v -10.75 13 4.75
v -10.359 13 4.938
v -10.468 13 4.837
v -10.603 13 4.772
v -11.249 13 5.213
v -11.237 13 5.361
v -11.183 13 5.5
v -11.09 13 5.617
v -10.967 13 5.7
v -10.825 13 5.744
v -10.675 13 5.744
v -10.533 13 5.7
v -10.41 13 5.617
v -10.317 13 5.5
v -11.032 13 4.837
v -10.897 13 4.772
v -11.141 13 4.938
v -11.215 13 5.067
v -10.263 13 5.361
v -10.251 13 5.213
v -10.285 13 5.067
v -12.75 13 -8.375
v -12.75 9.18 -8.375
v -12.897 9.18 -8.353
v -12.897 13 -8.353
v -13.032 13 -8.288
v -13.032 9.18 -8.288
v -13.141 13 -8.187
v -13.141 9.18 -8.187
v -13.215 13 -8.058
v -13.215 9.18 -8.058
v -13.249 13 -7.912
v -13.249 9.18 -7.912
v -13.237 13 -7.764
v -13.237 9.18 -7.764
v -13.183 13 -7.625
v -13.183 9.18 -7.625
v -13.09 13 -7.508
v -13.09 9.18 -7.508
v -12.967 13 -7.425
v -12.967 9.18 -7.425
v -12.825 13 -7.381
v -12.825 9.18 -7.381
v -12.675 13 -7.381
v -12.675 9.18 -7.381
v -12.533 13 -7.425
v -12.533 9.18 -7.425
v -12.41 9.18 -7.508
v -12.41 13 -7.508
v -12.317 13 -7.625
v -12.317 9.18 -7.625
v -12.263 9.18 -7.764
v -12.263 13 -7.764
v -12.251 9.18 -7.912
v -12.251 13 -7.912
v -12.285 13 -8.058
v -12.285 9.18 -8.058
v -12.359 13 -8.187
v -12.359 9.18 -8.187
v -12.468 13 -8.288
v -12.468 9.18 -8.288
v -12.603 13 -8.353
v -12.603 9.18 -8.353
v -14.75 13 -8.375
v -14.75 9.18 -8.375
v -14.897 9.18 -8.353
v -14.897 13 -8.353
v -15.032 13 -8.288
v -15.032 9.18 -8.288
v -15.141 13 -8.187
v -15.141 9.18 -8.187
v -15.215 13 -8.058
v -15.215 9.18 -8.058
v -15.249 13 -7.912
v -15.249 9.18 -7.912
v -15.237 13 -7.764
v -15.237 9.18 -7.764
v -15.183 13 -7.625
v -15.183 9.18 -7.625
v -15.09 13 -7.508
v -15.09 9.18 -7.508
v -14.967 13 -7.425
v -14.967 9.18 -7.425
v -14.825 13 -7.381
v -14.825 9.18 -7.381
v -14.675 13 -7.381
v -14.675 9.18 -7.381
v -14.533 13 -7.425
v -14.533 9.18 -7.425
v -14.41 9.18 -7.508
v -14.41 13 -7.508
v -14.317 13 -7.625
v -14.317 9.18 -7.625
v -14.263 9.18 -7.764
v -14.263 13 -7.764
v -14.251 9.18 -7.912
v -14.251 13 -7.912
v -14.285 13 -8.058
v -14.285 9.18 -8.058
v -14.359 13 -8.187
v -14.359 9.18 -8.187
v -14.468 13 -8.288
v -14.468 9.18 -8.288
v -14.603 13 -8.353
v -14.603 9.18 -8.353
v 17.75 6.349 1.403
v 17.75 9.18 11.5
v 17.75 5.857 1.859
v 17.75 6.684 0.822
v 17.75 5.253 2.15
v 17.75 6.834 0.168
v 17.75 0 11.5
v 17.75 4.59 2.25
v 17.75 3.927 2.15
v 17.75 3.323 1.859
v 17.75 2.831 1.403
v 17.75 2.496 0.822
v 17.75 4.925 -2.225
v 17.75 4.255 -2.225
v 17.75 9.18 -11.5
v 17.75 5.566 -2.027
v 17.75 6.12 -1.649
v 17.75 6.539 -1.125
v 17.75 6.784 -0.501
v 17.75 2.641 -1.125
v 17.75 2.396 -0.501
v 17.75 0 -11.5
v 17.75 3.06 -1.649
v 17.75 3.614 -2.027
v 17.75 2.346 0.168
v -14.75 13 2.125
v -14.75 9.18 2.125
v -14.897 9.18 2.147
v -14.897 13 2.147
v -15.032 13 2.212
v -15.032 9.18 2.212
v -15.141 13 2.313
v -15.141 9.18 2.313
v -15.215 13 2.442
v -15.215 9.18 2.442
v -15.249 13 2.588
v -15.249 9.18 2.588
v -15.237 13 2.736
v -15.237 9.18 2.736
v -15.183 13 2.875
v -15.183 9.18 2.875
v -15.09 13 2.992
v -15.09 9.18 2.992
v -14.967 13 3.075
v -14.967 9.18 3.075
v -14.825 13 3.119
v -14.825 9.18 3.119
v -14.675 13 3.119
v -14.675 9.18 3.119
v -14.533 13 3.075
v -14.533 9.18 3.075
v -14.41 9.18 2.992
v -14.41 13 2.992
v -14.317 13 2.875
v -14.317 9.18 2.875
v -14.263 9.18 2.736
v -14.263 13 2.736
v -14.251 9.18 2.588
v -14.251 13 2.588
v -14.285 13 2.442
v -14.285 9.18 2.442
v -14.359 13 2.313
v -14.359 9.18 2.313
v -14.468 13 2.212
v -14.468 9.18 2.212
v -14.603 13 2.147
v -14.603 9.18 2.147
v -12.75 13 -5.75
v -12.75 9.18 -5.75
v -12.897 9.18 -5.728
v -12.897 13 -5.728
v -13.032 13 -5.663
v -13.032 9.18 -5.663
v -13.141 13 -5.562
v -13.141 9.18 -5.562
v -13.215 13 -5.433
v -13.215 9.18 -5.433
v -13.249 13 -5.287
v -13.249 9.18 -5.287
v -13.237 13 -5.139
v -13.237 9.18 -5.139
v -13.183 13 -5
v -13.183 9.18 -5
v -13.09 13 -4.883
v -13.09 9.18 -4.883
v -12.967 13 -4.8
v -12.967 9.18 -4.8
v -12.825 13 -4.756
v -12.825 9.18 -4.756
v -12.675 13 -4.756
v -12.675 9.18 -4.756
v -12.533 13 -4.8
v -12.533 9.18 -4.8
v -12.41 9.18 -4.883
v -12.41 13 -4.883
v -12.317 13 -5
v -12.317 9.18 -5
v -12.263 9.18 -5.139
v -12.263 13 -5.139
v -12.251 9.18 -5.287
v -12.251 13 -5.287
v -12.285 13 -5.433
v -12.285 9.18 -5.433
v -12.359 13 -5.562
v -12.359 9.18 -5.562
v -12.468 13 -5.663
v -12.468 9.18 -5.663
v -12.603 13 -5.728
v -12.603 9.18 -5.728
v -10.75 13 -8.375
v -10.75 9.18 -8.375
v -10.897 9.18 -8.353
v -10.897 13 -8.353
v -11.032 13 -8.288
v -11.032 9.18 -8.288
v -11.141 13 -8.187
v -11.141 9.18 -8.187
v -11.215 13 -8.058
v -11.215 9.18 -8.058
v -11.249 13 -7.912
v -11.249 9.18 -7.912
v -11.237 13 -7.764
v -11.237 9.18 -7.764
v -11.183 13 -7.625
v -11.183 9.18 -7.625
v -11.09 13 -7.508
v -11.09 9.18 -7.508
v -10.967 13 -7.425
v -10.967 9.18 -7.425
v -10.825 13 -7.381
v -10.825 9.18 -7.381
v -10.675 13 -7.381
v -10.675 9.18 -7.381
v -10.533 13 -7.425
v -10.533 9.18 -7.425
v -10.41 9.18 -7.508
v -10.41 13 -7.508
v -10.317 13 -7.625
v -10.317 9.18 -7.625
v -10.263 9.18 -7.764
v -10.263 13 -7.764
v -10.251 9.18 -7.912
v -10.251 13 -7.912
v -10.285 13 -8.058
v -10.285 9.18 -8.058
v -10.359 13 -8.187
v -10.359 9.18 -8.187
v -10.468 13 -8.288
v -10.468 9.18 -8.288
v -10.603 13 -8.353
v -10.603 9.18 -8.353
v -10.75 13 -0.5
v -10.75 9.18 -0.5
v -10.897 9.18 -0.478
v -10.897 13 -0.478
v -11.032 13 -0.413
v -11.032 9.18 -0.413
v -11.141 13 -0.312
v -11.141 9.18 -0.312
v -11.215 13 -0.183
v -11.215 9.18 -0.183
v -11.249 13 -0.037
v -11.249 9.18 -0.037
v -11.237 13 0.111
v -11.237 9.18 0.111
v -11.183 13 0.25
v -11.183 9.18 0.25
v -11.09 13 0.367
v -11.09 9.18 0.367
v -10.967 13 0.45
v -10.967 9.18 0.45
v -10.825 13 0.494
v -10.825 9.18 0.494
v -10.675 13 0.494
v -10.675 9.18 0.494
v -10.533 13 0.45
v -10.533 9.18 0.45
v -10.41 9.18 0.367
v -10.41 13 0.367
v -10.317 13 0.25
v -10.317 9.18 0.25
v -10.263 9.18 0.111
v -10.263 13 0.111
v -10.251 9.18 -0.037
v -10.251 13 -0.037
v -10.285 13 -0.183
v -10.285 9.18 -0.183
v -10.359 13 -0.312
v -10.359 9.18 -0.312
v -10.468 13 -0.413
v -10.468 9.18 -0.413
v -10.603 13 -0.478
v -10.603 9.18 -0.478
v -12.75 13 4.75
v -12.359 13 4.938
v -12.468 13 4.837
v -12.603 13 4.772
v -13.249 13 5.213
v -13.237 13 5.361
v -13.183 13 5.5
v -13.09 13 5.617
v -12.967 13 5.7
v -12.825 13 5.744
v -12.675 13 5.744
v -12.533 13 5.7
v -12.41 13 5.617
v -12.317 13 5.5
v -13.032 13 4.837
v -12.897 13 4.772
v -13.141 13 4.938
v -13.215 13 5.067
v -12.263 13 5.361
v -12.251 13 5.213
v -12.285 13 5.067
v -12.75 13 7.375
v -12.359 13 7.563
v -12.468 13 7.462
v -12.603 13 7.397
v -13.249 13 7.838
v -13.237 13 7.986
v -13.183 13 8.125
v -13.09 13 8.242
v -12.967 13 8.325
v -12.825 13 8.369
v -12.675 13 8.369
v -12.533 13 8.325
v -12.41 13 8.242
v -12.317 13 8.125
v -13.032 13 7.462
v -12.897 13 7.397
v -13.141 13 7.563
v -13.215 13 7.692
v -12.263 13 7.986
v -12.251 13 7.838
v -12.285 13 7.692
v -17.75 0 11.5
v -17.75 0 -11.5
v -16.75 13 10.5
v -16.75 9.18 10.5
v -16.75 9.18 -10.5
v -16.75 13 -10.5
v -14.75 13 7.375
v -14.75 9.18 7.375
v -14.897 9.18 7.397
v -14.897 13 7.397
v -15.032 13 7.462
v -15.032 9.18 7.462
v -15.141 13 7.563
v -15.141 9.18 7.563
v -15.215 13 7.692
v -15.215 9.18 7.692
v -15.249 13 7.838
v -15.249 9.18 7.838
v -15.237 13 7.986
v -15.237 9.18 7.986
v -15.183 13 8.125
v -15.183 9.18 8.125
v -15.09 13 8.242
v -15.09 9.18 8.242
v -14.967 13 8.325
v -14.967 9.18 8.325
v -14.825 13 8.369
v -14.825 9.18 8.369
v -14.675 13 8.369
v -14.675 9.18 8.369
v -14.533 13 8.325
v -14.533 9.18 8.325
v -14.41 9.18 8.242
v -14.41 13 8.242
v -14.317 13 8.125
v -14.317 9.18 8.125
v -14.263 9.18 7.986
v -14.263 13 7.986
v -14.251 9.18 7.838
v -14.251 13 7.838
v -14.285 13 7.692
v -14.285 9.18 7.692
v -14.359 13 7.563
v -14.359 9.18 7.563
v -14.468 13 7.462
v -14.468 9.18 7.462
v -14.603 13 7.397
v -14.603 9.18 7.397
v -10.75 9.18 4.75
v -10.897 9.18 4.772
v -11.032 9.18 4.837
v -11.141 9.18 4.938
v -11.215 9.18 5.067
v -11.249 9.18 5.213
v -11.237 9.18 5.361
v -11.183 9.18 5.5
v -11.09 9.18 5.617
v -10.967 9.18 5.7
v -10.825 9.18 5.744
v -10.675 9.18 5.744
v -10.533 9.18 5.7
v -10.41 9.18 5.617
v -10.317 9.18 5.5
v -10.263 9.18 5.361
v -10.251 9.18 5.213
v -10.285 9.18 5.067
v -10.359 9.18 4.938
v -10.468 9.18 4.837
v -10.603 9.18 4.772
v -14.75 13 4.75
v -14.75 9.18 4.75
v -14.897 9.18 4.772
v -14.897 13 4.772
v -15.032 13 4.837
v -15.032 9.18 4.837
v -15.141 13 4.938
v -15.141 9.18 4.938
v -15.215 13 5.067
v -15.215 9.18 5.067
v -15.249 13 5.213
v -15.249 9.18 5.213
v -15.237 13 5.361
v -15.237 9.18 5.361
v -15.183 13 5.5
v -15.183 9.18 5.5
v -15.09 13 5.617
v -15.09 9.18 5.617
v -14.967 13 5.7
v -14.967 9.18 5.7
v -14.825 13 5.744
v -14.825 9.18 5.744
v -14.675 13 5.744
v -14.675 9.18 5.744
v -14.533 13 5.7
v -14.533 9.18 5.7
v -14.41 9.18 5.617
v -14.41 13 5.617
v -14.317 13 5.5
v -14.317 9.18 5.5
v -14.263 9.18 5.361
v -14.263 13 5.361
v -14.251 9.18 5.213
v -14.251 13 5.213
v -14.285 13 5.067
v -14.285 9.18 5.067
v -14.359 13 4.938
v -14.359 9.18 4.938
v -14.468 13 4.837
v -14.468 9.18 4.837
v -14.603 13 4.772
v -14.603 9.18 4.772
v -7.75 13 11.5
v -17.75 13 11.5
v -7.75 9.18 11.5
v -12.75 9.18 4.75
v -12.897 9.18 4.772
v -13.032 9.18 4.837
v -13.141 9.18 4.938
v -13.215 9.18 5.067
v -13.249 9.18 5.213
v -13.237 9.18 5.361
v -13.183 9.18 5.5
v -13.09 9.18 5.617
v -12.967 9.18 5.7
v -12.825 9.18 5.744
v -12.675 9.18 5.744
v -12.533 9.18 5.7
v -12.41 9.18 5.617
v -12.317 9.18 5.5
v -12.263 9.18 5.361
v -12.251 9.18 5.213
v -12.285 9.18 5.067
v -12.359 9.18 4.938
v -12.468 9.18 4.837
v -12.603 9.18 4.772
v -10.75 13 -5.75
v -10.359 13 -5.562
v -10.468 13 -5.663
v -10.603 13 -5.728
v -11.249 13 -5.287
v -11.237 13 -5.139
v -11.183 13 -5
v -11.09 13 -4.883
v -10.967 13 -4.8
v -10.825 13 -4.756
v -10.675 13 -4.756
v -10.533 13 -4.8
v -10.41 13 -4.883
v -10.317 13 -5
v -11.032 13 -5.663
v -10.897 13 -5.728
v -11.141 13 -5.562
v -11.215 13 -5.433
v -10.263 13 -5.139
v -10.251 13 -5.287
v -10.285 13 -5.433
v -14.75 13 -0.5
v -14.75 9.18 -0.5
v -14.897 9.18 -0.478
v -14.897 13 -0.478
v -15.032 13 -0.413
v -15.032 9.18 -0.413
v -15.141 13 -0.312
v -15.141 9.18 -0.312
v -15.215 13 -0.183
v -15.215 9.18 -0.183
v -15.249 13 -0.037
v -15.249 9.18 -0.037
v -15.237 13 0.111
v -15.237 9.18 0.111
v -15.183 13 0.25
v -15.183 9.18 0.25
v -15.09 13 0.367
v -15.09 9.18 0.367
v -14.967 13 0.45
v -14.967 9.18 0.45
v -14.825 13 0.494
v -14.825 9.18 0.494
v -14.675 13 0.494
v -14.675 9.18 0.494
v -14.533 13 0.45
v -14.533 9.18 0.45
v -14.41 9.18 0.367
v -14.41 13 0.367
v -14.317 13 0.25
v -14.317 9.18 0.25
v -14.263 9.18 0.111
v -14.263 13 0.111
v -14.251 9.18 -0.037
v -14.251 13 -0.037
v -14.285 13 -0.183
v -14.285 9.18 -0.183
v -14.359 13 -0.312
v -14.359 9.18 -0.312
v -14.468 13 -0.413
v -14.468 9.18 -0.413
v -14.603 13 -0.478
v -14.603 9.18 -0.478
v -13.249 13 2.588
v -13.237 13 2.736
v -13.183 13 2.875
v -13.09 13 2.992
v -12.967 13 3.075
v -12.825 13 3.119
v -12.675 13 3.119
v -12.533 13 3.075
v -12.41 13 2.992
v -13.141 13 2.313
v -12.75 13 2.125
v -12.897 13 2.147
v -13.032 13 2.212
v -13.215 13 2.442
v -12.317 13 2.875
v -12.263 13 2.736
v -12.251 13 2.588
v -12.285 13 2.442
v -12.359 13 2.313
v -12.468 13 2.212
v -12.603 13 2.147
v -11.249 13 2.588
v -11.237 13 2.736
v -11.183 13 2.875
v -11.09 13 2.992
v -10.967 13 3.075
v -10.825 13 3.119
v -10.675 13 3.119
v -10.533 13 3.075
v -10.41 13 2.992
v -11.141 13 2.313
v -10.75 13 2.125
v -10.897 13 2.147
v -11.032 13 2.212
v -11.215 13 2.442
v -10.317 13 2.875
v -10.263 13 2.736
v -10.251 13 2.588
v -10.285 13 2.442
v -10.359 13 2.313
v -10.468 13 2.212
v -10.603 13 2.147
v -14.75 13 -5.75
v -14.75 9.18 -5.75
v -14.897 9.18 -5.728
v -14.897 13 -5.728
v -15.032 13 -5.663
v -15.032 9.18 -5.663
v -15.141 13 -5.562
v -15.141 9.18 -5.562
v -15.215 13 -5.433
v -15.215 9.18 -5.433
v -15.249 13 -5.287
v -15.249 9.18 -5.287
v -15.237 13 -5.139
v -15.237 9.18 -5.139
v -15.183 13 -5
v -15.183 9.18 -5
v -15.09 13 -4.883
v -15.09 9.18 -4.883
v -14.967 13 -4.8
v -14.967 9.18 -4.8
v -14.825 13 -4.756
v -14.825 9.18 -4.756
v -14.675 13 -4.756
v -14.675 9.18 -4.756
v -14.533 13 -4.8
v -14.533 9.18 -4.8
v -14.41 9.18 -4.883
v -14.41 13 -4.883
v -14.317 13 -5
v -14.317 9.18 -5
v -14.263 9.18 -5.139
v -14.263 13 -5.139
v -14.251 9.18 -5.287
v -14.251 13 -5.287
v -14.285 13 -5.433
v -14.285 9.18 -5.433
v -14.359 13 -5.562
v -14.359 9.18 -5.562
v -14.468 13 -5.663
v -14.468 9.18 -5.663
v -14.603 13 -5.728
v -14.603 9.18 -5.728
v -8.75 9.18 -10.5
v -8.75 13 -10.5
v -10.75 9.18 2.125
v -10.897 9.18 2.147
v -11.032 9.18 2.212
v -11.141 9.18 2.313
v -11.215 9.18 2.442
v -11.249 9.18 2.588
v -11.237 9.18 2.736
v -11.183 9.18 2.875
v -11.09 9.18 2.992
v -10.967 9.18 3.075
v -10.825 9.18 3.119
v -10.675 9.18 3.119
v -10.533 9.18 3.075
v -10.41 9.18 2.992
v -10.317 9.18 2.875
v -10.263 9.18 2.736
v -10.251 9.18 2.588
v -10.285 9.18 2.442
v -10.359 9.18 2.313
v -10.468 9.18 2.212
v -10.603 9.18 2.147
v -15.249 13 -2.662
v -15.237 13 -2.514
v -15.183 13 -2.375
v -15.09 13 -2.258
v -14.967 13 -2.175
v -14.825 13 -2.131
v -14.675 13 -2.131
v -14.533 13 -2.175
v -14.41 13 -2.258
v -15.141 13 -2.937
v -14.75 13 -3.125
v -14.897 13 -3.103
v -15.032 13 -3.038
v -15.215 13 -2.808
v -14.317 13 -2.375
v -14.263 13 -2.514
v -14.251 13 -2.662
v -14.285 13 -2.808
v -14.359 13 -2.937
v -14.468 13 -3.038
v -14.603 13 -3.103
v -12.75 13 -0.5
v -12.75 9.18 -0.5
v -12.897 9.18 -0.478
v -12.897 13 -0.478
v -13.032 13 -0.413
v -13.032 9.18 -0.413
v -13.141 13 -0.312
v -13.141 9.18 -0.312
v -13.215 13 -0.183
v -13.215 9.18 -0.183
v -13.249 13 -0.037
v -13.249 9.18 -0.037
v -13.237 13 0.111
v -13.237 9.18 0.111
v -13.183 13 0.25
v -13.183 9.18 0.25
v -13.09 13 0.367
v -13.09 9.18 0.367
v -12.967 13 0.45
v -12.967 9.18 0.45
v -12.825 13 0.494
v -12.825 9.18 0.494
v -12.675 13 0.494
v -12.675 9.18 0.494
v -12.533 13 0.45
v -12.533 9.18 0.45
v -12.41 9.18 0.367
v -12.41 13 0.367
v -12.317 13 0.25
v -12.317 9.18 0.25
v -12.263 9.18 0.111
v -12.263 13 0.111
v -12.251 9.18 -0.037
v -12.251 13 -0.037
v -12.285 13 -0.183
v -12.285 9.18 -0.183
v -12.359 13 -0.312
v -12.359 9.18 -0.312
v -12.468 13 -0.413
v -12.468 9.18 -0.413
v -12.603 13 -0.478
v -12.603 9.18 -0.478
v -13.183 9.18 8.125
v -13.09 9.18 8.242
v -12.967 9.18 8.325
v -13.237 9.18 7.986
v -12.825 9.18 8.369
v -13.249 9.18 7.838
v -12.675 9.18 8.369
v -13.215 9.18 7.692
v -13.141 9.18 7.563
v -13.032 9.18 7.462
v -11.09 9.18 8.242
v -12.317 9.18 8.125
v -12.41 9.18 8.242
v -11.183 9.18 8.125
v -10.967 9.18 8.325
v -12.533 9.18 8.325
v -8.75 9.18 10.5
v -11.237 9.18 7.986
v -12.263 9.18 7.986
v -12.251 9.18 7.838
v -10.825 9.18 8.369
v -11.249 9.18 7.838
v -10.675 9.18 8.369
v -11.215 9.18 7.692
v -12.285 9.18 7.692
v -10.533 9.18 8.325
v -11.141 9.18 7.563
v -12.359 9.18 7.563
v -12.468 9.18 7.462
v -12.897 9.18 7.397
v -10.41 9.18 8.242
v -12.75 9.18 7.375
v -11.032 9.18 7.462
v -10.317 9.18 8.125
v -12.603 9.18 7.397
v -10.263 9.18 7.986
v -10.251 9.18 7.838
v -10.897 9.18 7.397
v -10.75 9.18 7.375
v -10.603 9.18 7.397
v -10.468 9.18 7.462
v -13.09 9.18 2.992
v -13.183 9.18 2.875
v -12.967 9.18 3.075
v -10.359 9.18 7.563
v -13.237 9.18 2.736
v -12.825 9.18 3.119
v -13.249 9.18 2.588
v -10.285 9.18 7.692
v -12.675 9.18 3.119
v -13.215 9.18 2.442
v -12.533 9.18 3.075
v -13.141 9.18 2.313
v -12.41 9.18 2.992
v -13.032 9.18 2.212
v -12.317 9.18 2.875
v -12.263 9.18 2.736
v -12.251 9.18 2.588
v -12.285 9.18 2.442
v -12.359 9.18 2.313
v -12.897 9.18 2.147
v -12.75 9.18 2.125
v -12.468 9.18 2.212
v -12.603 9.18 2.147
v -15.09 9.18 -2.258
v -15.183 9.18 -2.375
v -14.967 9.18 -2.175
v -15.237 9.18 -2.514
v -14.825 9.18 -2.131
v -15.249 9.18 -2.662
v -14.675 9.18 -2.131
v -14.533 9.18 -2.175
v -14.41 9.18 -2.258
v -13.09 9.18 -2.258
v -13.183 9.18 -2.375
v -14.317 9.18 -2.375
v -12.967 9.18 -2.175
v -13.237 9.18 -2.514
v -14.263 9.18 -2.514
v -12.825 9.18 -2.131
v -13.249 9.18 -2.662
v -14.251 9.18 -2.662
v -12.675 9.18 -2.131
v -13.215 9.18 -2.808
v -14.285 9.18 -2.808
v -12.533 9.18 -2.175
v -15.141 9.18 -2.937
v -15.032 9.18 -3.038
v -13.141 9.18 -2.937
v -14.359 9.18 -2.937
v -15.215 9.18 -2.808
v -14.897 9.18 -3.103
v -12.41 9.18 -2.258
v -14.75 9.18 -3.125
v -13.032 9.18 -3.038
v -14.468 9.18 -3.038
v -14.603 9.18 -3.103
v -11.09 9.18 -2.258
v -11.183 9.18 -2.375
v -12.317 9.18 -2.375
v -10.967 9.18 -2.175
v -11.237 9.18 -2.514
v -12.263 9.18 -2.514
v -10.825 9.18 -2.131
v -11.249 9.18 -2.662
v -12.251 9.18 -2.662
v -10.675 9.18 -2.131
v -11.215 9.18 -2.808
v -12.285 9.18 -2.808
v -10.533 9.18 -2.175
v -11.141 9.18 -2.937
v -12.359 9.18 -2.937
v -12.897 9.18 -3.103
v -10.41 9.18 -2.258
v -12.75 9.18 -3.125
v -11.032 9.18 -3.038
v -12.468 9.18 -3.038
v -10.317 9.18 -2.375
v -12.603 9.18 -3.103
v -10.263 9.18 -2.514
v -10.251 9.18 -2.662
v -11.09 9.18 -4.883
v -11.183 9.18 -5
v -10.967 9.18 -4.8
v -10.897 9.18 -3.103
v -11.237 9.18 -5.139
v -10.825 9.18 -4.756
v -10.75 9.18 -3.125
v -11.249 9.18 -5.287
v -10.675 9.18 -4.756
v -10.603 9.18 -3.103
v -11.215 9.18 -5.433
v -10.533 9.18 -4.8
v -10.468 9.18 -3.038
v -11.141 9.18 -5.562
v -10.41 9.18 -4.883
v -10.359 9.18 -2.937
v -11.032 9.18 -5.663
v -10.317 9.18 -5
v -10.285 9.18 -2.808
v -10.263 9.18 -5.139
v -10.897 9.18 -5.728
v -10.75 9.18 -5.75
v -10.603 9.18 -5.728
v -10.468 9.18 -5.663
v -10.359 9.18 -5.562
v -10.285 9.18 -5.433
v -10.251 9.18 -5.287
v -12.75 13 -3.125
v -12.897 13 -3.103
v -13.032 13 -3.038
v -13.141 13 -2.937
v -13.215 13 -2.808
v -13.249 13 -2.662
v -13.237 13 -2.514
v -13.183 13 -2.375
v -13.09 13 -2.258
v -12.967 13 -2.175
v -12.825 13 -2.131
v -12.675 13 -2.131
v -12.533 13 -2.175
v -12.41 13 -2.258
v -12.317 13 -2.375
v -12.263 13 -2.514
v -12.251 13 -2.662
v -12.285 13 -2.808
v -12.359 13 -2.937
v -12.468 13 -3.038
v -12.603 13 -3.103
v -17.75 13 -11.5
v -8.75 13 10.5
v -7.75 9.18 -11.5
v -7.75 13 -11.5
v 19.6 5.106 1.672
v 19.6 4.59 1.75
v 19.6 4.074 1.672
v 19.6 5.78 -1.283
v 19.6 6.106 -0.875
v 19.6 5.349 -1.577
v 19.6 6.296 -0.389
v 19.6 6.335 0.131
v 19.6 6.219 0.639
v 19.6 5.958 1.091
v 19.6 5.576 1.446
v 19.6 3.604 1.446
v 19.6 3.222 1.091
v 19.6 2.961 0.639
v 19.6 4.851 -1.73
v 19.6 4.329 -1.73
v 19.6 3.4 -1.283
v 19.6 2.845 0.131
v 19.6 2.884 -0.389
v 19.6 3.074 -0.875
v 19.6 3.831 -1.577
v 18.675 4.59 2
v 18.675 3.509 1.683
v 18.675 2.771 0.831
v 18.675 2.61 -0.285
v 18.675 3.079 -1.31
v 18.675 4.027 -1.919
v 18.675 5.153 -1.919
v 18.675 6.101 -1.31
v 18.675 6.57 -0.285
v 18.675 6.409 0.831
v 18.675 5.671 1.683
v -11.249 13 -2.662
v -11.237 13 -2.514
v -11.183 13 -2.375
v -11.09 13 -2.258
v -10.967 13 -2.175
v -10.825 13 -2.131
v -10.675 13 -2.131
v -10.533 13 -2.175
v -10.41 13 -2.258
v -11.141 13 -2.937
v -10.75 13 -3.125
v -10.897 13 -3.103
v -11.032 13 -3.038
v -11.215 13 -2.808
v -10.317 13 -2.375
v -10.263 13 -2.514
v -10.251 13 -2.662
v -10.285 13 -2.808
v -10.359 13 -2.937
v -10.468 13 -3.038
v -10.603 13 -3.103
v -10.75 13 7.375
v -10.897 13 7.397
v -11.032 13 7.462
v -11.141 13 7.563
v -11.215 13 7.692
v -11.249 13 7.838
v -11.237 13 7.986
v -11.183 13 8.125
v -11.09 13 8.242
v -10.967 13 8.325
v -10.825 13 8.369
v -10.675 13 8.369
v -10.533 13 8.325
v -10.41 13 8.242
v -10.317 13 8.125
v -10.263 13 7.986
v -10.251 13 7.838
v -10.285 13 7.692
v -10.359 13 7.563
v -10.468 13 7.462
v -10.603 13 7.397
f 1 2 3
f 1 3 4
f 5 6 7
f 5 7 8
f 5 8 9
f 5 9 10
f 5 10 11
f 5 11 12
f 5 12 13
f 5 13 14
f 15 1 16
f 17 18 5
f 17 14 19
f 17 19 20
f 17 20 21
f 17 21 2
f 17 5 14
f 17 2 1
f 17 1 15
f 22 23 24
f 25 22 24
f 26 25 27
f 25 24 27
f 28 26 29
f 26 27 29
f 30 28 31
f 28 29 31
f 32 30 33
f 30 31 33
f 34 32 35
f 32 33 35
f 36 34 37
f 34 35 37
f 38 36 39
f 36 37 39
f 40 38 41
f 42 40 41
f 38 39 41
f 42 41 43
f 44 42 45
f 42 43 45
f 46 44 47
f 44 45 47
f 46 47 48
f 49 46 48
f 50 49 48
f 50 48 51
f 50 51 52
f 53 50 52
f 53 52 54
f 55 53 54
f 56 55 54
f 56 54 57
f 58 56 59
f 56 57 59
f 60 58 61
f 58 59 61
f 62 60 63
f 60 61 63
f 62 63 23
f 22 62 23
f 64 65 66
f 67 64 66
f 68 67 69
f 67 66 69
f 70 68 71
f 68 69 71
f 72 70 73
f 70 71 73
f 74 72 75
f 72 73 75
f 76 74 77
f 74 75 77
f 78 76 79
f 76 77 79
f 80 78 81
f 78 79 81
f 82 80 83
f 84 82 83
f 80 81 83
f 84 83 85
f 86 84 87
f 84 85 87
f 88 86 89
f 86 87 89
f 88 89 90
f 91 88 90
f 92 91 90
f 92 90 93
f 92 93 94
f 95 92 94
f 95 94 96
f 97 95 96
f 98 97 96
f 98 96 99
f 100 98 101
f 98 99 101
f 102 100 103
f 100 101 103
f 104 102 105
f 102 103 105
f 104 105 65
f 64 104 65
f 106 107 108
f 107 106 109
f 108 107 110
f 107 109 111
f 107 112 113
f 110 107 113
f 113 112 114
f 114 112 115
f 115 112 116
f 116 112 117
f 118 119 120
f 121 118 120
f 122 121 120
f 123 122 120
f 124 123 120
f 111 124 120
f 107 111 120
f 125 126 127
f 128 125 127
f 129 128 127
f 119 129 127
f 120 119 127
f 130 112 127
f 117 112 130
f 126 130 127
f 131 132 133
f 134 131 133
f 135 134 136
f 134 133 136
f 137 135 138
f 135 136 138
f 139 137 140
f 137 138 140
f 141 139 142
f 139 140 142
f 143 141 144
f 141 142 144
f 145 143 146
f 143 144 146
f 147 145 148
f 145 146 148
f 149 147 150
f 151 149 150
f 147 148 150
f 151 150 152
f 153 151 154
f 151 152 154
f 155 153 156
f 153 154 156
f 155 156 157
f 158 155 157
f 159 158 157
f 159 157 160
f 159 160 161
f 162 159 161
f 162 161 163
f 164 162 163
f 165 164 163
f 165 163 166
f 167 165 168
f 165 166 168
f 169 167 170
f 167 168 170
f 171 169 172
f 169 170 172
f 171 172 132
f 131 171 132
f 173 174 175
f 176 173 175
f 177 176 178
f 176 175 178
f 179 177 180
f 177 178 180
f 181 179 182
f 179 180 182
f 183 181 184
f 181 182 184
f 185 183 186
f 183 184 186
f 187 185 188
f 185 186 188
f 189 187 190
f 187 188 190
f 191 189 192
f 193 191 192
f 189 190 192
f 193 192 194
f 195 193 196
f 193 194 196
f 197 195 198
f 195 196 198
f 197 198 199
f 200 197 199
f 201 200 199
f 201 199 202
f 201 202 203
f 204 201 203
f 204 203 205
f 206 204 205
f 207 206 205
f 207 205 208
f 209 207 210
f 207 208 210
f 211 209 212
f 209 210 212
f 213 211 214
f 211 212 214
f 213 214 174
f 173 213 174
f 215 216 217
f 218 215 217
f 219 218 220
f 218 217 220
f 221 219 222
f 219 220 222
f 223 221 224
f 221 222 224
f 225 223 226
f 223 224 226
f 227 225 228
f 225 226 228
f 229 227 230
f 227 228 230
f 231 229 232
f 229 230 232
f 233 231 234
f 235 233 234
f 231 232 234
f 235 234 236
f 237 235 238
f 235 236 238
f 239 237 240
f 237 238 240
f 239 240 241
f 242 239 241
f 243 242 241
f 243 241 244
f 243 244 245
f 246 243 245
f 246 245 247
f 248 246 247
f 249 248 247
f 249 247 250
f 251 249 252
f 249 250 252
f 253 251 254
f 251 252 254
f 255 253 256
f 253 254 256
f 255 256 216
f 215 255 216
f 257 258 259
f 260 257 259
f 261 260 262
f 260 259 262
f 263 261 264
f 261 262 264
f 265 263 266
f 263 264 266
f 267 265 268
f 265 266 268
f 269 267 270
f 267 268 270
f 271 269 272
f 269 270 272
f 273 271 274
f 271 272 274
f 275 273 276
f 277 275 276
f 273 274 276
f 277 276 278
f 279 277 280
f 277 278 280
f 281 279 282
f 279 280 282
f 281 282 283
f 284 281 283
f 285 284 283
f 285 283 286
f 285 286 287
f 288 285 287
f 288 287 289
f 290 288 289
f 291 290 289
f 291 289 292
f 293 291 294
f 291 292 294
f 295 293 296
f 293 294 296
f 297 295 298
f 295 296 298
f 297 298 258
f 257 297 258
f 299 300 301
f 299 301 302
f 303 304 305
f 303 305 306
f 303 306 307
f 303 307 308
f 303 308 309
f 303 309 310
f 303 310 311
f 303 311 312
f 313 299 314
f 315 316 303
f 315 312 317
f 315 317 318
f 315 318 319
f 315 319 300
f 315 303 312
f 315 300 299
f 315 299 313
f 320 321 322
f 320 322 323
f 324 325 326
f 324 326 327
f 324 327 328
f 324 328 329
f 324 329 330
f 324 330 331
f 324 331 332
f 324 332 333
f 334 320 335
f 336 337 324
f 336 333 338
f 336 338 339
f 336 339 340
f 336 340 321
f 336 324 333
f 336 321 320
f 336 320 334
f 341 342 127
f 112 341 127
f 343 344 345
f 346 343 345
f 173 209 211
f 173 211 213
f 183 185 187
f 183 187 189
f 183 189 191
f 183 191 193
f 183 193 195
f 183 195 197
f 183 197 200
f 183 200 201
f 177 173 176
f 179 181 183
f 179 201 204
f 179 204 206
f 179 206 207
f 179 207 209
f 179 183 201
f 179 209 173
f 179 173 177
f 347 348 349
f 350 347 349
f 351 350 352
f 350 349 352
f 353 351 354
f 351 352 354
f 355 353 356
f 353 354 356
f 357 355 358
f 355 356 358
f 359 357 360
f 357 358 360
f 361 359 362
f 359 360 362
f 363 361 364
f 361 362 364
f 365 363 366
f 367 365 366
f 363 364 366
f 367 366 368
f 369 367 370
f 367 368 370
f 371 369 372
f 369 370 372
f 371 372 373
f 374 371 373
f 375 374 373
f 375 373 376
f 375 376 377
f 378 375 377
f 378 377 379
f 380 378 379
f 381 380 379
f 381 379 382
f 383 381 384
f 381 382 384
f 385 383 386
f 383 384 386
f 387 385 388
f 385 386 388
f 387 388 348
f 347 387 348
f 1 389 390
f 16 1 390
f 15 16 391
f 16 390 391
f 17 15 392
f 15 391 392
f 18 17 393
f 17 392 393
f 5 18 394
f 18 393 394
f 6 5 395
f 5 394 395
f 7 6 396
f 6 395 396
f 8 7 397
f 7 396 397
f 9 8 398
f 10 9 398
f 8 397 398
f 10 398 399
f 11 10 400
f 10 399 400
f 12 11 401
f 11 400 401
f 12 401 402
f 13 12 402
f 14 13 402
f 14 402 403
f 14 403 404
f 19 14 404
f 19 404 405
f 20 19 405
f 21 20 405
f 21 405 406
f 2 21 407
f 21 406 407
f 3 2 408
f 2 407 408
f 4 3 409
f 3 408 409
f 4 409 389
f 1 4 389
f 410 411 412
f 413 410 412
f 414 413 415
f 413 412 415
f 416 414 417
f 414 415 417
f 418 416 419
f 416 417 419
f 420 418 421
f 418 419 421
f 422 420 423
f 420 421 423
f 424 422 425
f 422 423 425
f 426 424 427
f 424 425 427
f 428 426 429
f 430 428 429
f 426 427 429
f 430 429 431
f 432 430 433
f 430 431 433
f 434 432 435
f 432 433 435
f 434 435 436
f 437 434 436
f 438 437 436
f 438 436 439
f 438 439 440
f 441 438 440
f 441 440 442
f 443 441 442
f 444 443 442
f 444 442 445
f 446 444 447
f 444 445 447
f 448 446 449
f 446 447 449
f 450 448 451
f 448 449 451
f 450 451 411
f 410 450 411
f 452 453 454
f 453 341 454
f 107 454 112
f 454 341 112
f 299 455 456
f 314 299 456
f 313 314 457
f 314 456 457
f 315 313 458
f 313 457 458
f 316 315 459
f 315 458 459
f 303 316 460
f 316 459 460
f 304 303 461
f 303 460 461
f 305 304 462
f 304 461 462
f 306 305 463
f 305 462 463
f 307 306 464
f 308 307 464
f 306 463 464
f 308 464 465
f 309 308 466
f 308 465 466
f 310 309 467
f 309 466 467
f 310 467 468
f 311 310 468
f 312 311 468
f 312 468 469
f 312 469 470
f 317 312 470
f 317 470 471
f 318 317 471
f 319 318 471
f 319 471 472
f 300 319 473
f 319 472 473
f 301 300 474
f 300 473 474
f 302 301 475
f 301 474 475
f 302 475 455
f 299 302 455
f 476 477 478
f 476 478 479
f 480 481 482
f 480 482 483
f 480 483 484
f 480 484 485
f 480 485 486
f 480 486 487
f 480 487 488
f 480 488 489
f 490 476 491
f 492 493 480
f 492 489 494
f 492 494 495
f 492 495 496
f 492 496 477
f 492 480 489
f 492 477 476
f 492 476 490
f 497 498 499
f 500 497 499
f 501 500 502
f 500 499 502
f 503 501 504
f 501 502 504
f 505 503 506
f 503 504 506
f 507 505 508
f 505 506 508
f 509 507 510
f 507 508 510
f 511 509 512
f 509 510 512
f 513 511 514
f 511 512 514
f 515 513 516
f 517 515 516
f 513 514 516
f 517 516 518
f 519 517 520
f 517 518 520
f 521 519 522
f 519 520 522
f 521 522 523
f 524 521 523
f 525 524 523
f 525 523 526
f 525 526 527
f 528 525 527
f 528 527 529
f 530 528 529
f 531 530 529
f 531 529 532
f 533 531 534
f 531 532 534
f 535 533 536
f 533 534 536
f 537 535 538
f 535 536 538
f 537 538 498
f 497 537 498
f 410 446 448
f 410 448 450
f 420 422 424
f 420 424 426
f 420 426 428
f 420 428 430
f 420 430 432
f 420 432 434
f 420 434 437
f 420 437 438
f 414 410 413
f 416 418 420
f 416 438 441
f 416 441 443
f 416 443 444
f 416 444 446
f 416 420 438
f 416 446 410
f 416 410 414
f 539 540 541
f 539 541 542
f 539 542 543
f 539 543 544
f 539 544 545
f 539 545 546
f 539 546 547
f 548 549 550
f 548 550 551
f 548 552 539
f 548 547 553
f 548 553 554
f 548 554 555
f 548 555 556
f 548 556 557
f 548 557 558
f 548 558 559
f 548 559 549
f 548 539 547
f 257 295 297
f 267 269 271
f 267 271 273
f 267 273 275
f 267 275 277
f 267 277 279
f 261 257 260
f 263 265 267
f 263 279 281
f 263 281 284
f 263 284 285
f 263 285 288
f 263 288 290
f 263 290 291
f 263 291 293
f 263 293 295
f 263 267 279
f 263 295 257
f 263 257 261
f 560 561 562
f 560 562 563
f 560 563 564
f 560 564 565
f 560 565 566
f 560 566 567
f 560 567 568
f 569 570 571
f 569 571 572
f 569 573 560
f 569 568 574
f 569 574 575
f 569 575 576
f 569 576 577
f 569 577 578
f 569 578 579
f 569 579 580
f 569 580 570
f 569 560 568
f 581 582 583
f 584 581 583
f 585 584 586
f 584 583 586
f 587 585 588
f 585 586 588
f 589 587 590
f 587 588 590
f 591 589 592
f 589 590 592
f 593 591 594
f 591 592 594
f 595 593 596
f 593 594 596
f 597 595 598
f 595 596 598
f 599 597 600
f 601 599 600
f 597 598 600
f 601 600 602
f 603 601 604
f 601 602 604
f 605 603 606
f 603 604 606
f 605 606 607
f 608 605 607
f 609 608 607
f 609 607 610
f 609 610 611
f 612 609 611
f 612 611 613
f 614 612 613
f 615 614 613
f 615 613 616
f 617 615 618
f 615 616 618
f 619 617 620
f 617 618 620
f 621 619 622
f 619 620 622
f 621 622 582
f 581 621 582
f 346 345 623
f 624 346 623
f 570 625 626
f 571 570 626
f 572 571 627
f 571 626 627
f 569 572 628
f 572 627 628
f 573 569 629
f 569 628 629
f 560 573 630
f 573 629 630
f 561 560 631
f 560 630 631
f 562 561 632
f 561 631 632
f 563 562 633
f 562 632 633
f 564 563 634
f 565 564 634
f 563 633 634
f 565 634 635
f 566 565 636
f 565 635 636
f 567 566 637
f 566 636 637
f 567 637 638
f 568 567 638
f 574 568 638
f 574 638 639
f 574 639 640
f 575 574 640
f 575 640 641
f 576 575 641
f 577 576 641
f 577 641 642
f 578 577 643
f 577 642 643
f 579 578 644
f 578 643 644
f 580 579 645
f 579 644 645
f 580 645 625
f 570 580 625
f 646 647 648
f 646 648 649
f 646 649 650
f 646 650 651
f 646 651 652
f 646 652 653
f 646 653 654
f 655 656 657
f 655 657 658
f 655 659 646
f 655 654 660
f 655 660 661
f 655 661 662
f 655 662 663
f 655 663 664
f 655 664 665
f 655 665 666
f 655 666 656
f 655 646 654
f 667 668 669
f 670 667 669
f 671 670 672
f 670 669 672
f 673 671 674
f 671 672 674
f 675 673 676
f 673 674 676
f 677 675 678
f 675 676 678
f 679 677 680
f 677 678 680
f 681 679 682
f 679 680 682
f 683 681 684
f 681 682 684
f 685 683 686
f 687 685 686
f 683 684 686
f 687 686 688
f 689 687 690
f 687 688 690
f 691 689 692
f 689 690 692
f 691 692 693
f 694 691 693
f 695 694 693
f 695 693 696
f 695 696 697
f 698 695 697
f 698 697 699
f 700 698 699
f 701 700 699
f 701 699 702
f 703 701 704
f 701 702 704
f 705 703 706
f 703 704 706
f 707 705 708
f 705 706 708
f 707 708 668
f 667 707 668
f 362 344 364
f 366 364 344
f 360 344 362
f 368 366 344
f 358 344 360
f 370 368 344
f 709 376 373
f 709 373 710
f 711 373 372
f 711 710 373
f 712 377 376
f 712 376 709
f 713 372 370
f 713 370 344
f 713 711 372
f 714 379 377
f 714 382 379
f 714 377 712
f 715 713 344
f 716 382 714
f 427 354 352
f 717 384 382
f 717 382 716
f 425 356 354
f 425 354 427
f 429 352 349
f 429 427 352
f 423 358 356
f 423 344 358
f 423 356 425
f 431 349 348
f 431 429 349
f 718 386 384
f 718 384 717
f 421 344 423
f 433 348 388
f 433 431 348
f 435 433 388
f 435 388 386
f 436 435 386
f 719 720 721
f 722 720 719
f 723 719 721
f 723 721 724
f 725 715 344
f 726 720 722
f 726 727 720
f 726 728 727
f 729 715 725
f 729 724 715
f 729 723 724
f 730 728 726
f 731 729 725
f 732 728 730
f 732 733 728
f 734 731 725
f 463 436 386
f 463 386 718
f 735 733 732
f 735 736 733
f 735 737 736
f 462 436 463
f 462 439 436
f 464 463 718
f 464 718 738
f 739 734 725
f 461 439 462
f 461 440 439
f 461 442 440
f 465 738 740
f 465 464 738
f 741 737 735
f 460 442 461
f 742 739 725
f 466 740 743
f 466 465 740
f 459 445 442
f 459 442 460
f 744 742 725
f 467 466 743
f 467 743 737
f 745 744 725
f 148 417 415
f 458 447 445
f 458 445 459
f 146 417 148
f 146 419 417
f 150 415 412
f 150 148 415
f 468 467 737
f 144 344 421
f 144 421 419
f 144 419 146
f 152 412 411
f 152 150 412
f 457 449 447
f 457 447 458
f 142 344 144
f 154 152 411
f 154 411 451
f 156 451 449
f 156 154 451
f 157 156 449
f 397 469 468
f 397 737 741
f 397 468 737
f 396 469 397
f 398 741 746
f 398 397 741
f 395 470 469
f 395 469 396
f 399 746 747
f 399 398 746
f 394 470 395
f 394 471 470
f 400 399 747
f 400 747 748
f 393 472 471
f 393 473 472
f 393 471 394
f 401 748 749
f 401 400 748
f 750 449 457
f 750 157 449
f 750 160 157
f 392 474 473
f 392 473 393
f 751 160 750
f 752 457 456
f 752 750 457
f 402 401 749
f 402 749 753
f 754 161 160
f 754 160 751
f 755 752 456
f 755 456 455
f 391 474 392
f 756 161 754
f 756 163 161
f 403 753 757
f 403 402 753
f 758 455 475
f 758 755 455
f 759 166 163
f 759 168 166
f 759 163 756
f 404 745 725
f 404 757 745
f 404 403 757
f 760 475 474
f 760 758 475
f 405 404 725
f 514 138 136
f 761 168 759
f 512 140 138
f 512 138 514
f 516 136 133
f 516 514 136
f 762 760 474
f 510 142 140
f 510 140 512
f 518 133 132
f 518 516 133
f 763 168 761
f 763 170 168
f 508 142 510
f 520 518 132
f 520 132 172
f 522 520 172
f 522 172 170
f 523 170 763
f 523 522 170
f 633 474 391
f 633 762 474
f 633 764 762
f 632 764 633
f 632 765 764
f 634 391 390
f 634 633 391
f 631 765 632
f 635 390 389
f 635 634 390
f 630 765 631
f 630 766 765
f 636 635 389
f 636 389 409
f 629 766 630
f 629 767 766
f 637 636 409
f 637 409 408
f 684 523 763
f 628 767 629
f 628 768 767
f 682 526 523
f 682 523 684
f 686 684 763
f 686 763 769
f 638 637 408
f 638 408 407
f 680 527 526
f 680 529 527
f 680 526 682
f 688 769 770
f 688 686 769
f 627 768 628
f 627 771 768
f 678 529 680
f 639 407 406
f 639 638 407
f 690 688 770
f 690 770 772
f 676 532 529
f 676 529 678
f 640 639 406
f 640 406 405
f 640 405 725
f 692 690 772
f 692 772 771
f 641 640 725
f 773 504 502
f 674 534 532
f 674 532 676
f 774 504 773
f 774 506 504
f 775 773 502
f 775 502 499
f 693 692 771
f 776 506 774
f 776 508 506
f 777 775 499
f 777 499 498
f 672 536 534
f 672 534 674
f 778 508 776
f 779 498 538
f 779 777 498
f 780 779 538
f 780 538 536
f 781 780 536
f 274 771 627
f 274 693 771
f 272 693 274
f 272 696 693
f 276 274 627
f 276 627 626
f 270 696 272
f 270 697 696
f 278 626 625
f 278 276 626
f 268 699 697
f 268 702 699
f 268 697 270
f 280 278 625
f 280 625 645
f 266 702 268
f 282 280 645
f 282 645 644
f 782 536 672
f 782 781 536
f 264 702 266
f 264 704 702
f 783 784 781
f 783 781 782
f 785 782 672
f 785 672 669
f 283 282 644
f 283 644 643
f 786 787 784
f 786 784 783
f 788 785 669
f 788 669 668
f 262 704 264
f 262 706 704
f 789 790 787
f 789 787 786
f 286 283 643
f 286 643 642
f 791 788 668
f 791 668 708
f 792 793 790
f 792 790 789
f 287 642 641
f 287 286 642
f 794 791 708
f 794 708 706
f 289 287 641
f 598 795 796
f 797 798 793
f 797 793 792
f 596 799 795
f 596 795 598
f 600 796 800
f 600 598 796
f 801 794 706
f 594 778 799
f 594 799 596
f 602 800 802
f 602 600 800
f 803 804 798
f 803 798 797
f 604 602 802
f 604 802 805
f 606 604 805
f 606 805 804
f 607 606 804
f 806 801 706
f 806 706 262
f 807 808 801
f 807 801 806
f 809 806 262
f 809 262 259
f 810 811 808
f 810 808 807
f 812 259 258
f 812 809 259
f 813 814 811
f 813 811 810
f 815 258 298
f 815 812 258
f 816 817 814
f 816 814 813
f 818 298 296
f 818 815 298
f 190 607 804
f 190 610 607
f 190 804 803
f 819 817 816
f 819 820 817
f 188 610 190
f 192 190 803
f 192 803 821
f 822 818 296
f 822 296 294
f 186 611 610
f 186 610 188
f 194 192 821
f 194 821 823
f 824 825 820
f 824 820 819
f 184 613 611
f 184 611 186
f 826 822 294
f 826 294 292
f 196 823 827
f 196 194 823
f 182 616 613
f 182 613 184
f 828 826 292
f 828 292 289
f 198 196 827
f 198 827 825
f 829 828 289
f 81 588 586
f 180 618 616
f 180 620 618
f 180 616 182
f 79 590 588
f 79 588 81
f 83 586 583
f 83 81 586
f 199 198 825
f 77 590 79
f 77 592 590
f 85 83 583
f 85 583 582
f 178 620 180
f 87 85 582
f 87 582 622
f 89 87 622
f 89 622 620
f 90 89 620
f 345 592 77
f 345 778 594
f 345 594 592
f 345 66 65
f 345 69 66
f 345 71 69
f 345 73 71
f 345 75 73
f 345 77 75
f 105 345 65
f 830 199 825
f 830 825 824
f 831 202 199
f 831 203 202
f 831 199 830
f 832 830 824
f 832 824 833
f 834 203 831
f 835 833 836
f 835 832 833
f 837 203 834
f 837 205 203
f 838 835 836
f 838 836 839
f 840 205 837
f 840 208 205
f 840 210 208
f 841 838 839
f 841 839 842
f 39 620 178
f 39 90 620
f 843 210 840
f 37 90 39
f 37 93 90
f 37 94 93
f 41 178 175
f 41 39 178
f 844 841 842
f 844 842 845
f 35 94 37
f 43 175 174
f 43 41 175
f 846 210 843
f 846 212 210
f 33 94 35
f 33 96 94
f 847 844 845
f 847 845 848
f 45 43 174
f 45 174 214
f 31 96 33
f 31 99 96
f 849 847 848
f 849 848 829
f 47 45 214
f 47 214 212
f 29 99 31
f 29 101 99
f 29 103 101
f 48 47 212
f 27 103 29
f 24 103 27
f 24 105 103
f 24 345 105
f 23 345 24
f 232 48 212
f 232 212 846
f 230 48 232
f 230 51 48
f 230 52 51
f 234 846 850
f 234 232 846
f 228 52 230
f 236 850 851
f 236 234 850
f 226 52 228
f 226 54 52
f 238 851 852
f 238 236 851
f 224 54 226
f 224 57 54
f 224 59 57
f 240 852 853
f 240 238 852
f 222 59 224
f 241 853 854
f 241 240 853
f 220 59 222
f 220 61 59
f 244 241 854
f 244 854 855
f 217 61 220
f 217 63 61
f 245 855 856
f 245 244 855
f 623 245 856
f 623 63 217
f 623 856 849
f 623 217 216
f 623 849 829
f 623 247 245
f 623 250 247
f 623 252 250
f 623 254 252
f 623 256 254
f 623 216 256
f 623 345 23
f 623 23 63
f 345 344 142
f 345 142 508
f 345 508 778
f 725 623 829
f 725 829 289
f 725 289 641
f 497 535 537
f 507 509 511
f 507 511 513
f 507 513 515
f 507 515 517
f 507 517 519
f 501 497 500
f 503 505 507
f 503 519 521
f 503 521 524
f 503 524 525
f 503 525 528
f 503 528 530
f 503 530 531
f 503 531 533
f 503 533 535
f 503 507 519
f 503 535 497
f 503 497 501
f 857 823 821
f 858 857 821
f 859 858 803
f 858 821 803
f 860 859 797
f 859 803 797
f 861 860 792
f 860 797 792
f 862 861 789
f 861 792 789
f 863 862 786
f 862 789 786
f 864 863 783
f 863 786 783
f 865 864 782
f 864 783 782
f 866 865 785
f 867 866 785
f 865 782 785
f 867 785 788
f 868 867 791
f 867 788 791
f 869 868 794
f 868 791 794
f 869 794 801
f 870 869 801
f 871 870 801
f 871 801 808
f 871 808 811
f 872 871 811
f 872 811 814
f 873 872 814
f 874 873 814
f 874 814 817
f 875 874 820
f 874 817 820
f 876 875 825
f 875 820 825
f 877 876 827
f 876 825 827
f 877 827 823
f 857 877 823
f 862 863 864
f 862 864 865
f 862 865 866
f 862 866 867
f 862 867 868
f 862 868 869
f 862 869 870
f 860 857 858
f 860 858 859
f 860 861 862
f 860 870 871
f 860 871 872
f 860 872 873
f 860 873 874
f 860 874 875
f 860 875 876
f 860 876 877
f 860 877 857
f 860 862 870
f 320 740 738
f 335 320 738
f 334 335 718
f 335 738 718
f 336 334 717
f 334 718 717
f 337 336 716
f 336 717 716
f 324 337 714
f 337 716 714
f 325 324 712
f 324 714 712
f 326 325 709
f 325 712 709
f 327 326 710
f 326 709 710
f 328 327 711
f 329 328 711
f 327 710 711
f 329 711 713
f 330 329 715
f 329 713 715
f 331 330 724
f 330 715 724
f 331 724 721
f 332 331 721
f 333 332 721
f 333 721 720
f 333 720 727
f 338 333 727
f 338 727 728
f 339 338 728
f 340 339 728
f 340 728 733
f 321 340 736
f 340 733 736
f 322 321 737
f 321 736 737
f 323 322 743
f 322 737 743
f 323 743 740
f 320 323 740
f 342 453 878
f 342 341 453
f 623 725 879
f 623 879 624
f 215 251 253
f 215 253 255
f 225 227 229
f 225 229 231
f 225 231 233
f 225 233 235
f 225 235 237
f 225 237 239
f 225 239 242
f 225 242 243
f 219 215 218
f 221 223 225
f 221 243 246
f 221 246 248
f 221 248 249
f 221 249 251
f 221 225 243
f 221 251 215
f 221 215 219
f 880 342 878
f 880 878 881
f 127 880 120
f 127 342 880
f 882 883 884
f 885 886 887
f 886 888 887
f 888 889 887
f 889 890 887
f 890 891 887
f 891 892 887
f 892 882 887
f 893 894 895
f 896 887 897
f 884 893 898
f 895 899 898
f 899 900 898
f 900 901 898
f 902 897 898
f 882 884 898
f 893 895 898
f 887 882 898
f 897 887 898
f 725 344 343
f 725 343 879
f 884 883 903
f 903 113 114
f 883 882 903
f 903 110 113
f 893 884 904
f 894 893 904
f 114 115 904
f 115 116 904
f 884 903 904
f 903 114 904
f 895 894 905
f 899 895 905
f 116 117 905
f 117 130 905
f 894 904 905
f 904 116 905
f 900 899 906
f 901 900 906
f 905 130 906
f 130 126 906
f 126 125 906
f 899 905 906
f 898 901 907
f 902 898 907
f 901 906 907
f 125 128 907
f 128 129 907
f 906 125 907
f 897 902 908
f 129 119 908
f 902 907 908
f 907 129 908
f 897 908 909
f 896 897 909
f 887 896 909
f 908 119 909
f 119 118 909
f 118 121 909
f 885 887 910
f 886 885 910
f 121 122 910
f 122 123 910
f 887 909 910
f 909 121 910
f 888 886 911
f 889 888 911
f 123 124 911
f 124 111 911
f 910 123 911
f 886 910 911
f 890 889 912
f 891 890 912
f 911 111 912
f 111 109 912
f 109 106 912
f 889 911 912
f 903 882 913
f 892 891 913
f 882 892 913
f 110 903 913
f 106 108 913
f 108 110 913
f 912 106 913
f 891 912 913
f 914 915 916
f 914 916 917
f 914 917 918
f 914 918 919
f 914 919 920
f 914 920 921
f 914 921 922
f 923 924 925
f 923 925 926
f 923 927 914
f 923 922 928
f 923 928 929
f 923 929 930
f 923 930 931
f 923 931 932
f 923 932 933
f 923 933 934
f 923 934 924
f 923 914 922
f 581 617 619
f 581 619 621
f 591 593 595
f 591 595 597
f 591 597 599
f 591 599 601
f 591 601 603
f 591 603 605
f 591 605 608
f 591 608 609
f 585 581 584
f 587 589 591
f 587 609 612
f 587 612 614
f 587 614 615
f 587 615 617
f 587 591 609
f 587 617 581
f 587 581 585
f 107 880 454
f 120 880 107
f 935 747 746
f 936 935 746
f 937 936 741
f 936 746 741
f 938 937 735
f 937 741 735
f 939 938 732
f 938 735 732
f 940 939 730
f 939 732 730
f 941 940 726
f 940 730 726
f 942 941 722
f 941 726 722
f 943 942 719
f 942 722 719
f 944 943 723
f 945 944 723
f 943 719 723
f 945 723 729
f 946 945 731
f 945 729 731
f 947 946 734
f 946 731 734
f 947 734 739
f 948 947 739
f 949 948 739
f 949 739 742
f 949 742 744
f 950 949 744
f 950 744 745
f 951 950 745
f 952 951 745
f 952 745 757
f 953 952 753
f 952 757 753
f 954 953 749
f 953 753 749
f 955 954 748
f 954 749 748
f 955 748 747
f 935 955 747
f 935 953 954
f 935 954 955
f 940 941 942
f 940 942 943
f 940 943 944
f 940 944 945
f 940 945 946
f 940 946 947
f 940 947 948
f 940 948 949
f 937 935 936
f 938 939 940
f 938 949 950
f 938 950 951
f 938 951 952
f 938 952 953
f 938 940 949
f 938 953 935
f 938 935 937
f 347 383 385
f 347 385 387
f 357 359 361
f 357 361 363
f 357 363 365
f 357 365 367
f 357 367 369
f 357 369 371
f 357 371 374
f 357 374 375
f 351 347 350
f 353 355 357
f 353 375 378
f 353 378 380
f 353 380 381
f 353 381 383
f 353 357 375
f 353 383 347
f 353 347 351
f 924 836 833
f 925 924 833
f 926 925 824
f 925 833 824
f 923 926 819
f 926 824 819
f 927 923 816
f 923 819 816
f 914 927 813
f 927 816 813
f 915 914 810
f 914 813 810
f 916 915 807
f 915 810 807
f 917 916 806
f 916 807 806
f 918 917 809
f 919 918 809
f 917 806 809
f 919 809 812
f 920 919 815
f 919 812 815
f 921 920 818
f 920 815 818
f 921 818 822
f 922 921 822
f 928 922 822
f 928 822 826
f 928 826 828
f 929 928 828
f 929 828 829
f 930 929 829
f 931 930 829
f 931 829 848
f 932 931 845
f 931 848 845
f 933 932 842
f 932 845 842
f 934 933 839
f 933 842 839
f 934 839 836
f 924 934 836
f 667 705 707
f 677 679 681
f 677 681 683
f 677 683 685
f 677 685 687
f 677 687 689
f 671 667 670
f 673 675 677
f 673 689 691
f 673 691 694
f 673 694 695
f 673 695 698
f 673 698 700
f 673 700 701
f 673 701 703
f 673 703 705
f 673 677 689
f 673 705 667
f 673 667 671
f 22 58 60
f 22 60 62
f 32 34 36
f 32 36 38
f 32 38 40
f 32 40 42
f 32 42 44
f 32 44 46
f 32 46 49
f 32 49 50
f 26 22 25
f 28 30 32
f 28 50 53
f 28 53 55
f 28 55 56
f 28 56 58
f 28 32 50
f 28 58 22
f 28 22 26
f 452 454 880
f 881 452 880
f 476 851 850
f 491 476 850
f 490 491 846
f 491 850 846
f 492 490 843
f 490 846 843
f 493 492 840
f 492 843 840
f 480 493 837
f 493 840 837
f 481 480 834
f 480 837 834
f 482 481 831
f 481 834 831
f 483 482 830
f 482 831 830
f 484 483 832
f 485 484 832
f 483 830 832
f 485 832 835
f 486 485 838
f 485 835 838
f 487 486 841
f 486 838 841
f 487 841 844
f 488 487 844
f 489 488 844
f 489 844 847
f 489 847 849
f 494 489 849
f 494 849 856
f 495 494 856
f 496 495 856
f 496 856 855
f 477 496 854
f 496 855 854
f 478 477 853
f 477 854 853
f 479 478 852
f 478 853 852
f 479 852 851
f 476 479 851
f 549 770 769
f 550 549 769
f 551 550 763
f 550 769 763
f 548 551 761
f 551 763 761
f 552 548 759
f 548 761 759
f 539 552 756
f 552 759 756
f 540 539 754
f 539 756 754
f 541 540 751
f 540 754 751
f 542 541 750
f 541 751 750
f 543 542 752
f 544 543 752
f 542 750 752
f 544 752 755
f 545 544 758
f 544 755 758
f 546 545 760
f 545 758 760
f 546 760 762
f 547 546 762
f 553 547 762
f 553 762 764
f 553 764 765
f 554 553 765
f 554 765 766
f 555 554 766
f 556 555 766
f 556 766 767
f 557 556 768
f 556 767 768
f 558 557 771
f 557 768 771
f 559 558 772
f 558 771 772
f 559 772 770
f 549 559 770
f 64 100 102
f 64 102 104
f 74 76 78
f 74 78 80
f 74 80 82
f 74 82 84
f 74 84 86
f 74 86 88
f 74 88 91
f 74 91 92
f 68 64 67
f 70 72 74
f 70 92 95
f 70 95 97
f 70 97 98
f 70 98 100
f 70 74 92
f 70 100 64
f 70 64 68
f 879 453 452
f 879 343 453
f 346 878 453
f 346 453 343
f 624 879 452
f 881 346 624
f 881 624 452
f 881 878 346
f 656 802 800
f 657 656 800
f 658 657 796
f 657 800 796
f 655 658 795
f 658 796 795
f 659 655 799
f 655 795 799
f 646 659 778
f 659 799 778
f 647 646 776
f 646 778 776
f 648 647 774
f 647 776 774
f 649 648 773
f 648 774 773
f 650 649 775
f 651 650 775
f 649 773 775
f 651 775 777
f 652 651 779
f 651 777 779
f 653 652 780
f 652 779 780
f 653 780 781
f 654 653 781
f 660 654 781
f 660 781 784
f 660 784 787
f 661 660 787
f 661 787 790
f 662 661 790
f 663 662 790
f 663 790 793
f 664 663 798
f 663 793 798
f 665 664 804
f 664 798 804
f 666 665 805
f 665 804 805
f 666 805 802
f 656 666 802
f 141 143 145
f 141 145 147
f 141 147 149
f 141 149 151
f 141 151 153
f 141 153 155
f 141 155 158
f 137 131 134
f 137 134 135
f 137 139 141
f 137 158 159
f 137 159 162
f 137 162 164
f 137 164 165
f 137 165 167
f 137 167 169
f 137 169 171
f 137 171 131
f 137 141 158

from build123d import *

# Parameters (mm, degrees)
SKETCH1_W           = 35.5
SKETCH1_H           = 23
BOSS_EXTRUDE1_DEPTH = 9.18
SKETCH2_W           = 10
SKETCH2_H           = 23
SKETCH2_W_2         = 8
SKETCH2_H_2         = 21
BOSS_EXTRUDE2_DEPTH = 3.82
SKETCH3_R           = 0.5
BOSS_EXTRUDE3_DEPTH = 3.82


with BuildPart() as part:
    # Sketch1 → Boss-Extrude1 (new body)
    with BuildSketch(Plane(origin=(0, 0, 0), x_dir=(1, 0, 0), z_dir=(0, 1, 0))):
        Rectangle(SKETCH1_W, SKETCH1_H)
    extrude(amount=BOSS_EXTRUDE1_DEPTH)

    # Sketch2 → Boss-Extrude2 (add)
    with BuildSketch(Plane(origin=(0, 9.18, 0), x_dir=(1, 0, 0), z_dir=(0, 1, 0))):
        with Locations((-12.75, 0)):
            Rectangle(SKETCH2_W, SKETCH2_H)
        with Locations((-12.75, 0)):
            Rectangle(SKETCH2_W_2, SKETCH2_H_2, mode=Mode.SUBTRACT)
    extrude(amount=BOSS_EXTRUDE2_DEPTH)

    # Sketch3 → Boss-Extrude3 (add)
    with BuildSketch(Plane(origin=(0, 9.18, 0), x_dir=(1, 0, 0), z_dir=(0, 1, 0))):
        with Locations(Location((-14.75, 7.875, 0), (0, 0, 90))):
            Circle(SKETCH3_R)
        with Locations(Location((-12.75, 7.875, 0), (0, 0, 90))):
            Circle(SKETCH3_R)
        with Locations(Location((-10.75, 7.875, 0), (0, 0, 90))):
            Circle(SKETCH3_R)
        with Locations(Location((-12.75, 5.25, 0), (0, 0, 90))):
            Circle(SKETCH3_R)
        with Locations(Location((-10.75, 5.25, 0), (0, 0, 90))):
            Circle(SKETCH3_R)
        with Locations(Location((-12.75, 2.625, 0), (0, 0, 90))):
            Circle(SKETCH3_R)
        with Locations(Location((-10.75, 2.625, 0), (0, 0, 90))):
            Circle(SKETCH3_R)
        with Locations(Location((-12.75, 0, 0), (0, 0, 90))):
            Circle(SKETCH3_R)
        with Locations(Location((-10.75, 0, 0), (0, 0, 90))):
            Circle(SKETCH3_R)
        with Locations(Location((-12.75, -2.625, 0), (0, 0, 90))):
            Circle(SKETCH3_R)
        with Locations(Location((-10.75, -2.625, 0), (0, 0, 90))):
            Circle(SKETCH3_R)
        with Locations(Location((-12.75, -5.25, 0), (0, 0, 90))):
            Circle(SKETCH3_R)
        with Locations(Location((-10.75, -5.25, 0), (0, 0, 90))):
            Circle(SKETCH3_R)
        with Locations(Location((-12.75, -7.875, 0), (0, 0, 90))):
            Circle(SKETCH3_R)
        with Locations(Location((-10.75, -7.875, 0), (0, 0, 90))):
            Circle(SKETCH3_R)
        with Locations(Location((-14.75, 5.25, 0), (0, 0, 90))):
            Circle(SKETCH3_R)
        with Locations(Location((-14.75, 2.625, 0), (0, 0, 90))):
            Circle(SKETCH3_R)
        with Locations(Location((-14.75, 0, 0), (0, 0, 90))):
            Circle(SKETCH3_R)
        with Locations(Location((-14.75, -2.625, 0), (0, 0, 90))):
            Circle(SKETCH3_R)
        with Locations(Location((-14.75, -5.25, 0), (0, 0, 90))):
            Circle(SKETCH3_R)
        with Locations(Location((-14.75, -7.875, 0), (0, 0, 90))):
            Circle(SKETCH3_R)
    extrude(amount=BOSS_EXTRUDE3_DEPTH)

    # Sketch5 → Revolve1 (revolve)
    with BuildSketch(Plane.XY, mode=Mode.PRIVATE) as revolve1_sk:
        Polygon((17.75, 4.59), (19.6, 4.59), (19.6, 6.34), (17.75, 6.84), align=None)
    revolve(revolve1_sk.sketch.rotate(Axis((17.75, 4.59, 0), (1, 0, 0)), 90), axis=Axis((17.75, 4.59, 0), (1, 0, 0)))


solid = part.part
